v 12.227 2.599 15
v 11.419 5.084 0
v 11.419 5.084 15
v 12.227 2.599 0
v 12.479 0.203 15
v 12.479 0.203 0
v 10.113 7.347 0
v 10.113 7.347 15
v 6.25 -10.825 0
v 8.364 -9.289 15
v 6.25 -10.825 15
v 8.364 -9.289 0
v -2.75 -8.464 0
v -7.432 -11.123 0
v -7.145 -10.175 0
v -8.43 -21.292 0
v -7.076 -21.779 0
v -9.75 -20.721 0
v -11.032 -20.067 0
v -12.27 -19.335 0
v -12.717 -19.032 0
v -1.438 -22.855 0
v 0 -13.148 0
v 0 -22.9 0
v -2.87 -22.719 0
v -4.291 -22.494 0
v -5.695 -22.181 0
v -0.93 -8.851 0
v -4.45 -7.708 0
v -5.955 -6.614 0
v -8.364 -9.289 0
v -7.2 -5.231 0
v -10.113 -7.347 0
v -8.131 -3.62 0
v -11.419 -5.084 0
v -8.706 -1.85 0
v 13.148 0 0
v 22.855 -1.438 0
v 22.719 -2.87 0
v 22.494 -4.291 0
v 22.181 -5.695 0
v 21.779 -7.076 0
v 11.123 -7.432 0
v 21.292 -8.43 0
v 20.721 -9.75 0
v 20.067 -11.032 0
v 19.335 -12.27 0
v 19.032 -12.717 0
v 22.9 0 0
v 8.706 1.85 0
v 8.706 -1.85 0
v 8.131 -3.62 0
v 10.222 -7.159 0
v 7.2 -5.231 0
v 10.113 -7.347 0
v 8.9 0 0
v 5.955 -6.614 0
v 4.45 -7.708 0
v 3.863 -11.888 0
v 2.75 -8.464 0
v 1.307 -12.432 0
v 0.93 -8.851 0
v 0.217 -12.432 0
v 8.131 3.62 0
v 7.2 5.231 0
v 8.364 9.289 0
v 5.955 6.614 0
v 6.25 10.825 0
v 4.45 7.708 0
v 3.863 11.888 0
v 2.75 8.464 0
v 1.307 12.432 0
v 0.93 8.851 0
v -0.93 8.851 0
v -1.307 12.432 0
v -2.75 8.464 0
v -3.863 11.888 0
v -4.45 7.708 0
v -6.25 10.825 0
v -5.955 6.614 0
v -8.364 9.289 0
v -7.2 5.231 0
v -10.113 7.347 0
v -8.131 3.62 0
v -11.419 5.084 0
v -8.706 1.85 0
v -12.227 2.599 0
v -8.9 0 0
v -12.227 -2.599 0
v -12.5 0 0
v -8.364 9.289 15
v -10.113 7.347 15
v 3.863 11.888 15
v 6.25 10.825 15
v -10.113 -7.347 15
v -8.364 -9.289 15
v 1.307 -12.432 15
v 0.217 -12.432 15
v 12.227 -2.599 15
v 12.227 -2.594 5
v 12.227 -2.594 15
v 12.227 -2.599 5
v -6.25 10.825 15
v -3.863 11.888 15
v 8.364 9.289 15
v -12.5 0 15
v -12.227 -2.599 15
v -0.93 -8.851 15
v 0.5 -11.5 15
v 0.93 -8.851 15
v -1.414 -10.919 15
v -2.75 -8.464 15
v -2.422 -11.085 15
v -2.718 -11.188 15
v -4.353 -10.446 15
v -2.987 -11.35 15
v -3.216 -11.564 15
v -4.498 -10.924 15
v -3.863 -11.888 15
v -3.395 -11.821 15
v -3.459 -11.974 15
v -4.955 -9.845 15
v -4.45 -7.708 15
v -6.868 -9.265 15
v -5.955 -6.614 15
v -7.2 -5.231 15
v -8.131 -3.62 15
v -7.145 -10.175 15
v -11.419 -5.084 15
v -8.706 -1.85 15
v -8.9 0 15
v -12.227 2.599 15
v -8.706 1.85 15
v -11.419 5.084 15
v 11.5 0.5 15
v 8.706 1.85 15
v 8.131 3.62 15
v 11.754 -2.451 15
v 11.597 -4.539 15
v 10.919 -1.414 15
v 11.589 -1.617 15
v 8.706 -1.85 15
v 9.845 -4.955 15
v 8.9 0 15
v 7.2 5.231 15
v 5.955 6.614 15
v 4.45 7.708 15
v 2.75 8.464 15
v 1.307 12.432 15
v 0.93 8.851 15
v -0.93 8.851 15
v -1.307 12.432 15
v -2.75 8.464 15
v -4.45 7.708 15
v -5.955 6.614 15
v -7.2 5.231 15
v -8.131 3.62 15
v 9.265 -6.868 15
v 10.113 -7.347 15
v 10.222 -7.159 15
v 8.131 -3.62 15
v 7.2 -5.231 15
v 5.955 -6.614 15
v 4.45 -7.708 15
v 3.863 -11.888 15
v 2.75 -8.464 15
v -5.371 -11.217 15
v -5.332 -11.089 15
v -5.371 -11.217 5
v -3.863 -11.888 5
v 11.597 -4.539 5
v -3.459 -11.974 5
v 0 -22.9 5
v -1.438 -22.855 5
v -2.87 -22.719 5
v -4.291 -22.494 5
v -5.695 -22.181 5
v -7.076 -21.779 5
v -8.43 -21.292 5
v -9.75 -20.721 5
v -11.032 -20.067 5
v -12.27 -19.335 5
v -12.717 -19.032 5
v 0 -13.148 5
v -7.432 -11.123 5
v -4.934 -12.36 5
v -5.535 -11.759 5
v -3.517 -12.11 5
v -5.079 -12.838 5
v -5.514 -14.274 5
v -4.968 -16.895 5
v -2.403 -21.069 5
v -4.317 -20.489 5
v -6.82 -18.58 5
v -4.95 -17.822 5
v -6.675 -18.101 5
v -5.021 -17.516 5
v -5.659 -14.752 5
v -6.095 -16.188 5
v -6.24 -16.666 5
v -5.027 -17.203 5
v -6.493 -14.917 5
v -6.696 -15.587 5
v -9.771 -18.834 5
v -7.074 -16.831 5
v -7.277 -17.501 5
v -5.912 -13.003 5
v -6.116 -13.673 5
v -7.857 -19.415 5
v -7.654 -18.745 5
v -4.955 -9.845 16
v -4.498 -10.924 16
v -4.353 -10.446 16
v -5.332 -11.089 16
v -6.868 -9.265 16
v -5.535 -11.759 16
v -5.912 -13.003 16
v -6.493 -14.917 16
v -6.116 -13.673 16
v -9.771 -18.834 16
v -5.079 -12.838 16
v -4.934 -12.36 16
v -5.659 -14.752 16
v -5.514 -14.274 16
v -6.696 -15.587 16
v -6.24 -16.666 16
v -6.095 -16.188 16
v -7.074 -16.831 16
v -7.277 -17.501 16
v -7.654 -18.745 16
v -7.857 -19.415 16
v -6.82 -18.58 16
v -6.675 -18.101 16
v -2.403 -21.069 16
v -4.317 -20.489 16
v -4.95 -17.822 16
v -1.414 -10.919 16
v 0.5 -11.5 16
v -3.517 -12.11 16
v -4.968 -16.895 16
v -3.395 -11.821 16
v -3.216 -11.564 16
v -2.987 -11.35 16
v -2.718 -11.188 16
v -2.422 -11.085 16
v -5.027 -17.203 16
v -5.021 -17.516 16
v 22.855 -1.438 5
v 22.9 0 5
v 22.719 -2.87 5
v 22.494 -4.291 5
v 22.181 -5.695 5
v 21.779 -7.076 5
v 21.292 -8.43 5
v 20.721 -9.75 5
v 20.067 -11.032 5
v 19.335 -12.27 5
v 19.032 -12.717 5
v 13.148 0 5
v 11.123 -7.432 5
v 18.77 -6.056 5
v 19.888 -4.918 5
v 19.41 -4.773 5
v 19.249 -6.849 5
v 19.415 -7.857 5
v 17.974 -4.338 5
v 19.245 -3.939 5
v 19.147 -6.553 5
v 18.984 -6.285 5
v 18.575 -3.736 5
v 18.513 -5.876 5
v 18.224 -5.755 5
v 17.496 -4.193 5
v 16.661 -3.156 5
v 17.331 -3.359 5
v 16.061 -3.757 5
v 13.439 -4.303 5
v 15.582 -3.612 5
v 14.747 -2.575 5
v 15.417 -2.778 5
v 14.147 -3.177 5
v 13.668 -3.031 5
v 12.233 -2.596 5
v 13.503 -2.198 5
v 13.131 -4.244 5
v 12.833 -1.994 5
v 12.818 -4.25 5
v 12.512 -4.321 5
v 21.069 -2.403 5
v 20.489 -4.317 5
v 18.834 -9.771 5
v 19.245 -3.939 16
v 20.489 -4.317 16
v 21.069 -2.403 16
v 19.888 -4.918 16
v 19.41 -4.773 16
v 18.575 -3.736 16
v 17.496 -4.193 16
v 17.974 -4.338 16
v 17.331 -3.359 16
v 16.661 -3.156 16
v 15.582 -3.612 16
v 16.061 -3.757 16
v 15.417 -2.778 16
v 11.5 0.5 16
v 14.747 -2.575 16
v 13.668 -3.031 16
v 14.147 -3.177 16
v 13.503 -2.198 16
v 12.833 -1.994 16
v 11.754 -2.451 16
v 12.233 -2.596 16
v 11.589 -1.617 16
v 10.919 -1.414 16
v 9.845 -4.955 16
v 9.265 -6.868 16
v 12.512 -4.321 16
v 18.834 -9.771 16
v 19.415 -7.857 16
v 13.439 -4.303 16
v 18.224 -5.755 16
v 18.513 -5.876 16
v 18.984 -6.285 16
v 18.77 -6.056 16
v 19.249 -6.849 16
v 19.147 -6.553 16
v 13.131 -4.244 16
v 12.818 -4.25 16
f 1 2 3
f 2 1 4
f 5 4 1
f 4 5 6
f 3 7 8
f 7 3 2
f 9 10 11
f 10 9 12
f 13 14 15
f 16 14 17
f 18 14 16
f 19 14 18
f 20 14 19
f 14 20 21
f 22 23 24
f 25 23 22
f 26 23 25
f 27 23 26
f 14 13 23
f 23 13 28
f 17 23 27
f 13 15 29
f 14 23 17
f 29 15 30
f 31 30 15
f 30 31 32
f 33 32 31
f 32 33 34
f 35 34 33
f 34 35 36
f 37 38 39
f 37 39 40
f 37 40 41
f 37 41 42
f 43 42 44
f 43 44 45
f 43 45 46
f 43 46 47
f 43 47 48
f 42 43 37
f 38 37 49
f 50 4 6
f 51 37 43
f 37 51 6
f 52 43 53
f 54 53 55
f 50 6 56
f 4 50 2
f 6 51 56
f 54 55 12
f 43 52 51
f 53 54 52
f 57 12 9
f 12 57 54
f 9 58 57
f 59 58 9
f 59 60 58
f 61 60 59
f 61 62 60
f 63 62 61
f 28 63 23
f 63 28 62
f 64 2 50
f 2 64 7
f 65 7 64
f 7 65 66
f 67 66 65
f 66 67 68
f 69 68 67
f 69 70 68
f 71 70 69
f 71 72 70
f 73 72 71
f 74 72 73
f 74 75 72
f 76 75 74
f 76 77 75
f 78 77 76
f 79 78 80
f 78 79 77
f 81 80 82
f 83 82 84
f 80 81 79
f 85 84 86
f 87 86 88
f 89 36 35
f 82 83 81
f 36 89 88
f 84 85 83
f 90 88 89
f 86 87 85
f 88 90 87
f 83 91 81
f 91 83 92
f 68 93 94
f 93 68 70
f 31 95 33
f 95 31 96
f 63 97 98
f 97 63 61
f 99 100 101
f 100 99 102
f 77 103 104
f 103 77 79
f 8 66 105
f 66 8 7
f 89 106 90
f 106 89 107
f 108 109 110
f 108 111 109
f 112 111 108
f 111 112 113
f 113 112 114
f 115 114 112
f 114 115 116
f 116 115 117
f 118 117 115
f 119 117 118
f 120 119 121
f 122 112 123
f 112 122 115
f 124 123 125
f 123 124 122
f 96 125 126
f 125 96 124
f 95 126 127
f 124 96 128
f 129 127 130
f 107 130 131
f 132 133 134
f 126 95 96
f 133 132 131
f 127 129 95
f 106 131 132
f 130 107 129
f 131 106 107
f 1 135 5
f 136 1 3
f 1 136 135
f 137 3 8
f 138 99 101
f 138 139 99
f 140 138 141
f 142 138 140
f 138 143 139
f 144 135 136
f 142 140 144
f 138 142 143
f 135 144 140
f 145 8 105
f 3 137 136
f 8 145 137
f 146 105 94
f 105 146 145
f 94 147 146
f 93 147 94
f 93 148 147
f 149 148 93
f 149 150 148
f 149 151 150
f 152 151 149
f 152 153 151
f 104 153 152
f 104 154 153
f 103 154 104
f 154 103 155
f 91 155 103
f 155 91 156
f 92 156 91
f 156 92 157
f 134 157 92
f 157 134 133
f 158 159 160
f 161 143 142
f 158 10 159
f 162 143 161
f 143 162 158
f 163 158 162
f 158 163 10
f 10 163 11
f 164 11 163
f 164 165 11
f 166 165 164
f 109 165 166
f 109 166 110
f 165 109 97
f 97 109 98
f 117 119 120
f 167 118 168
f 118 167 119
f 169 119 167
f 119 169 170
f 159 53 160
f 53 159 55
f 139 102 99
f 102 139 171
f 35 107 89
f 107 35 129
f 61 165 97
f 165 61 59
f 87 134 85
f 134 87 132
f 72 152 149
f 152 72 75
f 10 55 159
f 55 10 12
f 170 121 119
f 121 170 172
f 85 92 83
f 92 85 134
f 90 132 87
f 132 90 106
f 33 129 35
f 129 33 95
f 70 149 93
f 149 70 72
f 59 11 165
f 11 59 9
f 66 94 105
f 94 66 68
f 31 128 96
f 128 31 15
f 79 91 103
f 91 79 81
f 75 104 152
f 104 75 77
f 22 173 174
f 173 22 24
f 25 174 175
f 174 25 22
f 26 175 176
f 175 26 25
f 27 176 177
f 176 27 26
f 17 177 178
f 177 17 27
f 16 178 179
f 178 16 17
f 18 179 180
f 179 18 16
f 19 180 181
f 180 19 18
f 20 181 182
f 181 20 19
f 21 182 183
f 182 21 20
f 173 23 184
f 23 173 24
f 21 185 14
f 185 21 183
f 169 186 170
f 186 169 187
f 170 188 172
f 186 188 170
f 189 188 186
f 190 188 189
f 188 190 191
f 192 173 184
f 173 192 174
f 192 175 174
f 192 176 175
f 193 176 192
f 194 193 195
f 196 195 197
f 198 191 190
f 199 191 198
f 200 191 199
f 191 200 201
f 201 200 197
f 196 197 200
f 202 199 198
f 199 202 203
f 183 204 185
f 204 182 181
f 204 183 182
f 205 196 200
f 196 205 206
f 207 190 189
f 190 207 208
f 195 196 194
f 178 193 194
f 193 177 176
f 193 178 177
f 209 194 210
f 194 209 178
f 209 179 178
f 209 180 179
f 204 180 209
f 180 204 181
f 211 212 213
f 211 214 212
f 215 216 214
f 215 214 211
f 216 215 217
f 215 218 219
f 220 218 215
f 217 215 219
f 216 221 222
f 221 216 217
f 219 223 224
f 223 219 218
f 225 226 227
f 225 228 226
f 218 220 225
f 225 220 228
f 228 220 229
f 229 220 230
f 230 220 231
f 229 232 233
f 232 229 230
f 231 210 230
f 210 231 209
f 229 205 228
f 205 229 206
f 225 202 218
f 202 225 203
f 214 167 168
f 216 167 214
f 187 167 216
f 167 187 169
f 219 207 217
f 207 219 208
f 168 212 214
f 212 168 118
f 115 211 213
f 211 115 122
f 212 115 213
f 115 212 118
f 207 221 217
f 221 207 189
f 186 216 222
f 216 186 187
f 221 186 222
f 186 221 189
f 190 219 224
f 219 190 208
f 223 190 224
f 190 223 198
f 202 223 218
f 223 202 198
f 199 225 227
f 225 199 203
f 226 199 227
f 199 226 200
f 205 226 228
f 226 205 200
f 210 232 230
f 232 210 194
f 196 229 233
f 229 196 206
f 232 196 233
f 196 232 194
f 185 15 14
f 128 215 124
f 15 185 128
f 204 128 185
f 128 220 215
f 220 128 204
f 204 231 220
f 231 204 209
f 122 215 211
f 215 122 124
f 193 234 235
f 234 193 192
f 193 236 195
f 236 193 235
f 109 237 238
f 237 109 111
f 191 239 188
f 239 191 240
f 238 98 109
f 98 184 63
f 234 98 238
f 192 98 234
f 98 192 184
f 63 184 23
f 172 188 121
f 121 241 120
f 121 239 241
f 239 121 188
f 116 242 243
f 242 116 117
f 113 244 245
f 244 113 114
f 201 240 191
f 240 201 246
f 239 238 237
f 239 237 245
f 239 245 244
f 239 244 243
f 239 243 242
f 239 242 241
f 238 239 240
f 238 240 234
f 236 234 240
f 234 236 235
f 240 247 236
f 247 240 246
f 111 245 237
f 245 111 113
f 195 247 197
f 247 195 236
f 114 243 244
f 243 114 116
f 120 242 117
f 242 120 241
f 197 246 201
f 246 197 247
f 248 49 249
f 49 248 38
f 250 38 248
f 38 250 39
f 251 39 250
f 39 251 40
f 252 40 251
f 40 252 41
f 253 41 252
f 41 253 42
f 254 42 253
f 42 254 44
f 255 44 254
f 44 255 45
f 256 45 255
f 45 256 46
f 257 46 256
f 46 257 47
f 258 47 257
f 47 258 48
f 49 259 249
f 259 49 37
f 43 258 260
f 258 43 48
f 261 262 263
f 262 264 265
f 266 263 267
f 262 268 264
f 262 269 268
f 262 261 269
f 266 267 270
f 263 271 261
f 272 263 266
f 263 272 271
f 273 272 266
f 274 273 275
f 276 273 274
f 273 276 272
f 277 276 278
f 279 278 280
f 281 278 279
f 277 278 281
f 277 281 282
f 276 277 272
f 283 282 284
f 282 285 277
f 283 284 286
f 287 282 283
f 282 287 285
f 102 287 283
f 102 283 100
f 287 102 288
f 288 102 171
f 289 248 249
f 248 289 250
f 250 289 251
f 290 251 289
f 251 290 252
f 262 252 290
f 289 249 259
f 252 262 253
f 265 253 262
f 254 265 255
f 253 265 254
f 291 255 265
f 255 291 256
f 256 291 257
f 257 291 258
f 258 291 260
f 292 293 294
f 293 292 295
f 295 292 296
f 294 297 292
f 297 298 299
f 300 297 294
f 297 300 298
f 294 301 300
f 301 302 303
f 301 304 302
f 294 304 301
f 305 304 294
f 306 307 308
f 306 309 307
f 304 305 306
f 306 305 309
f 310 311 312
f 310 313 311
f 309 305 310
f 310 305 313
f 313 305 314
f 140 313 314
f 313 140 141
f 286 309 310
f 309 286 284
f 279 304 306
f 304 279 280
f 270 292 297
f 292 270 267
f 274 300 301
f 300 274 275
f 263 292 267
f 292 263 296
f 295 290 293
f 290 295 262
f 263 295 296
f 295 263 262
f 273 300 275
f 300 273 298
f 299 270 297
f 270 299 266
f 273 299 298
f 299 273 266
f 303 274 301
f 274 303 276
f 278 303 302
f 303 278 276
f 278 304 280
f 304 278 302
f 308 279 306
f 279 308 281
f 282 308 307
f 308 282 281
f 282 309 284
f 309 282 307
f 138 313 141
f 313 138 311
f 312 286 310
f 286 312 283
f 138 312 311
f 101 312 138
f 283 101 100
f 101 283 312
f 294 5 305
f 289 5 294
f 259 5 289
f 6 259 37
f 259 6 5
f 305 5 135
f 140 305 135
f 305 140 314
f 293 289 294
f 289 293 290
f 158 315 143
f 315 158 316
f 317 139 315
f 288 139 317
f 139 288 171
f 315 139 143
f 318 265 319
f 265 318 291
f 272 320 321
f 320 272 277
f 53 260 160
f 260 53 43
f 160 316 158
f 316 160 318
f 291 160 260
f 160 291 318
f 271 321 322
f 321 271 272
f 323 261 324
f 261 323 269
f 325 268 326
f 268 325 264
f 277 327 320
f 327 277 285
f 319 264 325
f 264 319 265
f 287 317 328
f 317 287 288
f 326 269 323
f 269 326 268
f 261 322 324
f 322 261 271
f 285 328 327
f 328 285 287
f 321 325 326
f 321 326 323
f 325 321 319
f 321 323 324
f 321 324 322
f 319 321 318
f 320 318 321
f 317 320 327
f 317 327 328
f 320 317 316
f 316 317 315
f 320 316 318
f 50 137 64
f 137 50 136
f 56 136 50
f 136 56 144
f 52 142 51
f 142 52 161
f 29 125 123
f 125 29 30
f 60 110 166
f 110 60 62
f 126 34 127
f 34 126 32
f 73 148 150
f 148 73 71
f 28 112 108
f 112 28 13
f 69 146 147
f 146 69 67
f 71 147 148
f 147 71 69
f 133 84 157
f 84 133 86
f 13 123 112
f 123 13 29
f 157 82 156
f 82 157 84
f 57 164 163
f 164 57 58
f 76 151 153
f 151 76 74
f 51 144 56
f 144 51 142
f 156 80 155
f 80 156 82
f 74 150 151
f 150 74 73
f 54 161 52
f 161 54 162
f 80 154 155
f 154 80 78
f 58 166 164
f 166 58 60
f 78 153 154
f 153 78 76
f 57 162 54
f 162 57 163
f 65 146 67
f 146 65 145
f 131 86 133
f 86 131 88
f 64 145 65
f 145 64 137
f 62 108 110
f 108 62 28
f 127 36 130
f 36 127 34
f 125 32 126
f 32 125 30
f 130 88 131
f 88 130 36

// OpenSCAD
// file: gondola_base.scad
$fn = 40;
// ------------ Base
base_radio = 50/2;
base_height = 5;
base_wall = 3;
// ------------ Holder
holder_base_radio = 25/2;
holder_base_height = base_height + 10;
holder_radio = 17/2;
holder_wall = 2;
holder_height = 50;
// ------------ Screw
screw_diameter = 4;


module HolderBase(delta = 0){
	difference(){
	    cylinder(r = holder_base_radio , h = holder_base_height);
	    cylinder(r = holder_radio - holder_wall + delta, h = holder_base_height);
	}
}

module Base(){
	module BaseBase(){
		size = [5, base_radio*2, base_height];
		difference(){
		    union(){
		        translate([0, 0, base_height/2])
		            cube(size, true);
		        rotate(90)
		            translate([0, 0, base_height/2])
		                cube(size, true);
		        }
		    cylinder(r = holder_radio - holder_wall, h = base_height);
		}
	
		difference(){
			cylinder(r = base_radio, h = base_height);
			cylinder(r = base_radio - base_wall, h = base_height);
		}
	}
	
	
	module Holder(){
		difference(){
			cylinder(r = holder_radio, h = holder_height);
			cylinder(r = holder_radio - holder_wall, h = holder_height);

translate([0, holder_radio, 0.9*holder_height])
			rotate([90,0,0])
			cylinder(r = screw_diameter/2, h = holder_radio*2);
	}
		}

BaseBase();
HolderBase();
Holder();
}
//Base();
// main file
include <gondola_base.scad>

holder_radio_shrink = 2;
arm_height = 10;
arm_belt_radius = 10;
$fn = 30;
trap_distance = 1.2; 
belt_height = 6;
arm_delta = 0.4;

/* 
 * Excerpt from... 
 * Parametric Encoder Wheel 
 * by Alex Franke (codecreations), March 2012
 * http://www.theFrankes.com
 * Licenced under Creative Commons Attribution - Non-Commercial - Share Alike 3.0 
*/
 
module arc( height, depth, radius, degrees ) {
    // This dies a horible death if it's not rendered here 
    // -- sucks up all memory and spins out of control 
    render() {
        difference() {
            // Outer ring
            rotate_extrude($fn = 100)
                translate([radius - height, 0, 0])
                    square([height,depth]);
         
            // Cut half off
            translate([0,-(radius+1),-.5]) 
                cube ([radius+1,(radius+1)*2,depth+1]);
         
            // Cover the other half as necessary
            rotate([0,0,180-degrees])
            translate([0,-(radius+1),-.5]) 
                cube ([radius+1,(radius+1)*2,depth+1]);
         
        }
    }
}

// Nicked from https://cdn.thingiverse.com/zipfiles/da/60/31/e2/71/RepRap_Pro_Ormerod_iamburnys_Y-axis_Belt_Clamp_-_Parametric.zip
module teeth(){
	module tooth() {
		x = 1.3;
		y = arm_height + belt_height;
		z= 0.75;
		a = 0.4;
	
		polyhedron(
			points=[[0,0,0] , [a,0,z] , [x-a,0,z] , [x,0,0] ,[0,y,0] , [a,y,z] , [x-a,y,z] , [x,y,0]],
			triangles=[[3,4,0],[3,7,4],  [1,5,2],[2,5,6],  [0,1,2],[0,2,3], [0,4,5], [0,5,1],  [7,6,5], [7,5,4],  [3,2,6], [3,6,7]
			]);
	}

	translate ([0,-10,0])
	        cube([arm_height + belt_height,10,2]);
	
	for (i = [0:4]) {
		translate([arm_height + belt_height,-10+(i*2),2])
			rotate([0,0,90])
				tooth();
    
	}
}

module ArmBase(){
	difference(){
	    arc(20, arm_height, holder_base_radio + arm_belt_radius + arm_delta, 33.75);   
	    translate([0, 0, arm_height/2]) arc(20, arm_height/2, holder_base_radio + arm_belt_radius+ arm_delta, 33.75);   
	}
}


module Trap(){
		translate([-3.5 - 2 - trap_distance, -5, (arm_height + belt_height)/2])
			resize([0, 0, arm_height + belt_height])
				rotate([180,-90, 0])
					hull(){
						cube([7, 10, 2], true);
						translate([0, -3.5/2, 3.5/3])rotate([0,90,0]) cylinder(7, 1.5, 1.5, true);
						translate([0, 5 - 3.5/2, 3.5/3])rotate([0,90,0]) cylinder(7, 1.5, 1.5, true);
					}
}


module RightArmTrap(){
	translate([0.5, -holder_base_radio + arm_belt_radius - 4 - arm_height/2, 0])
		rotate([0,0,-33.75/2]){
			translate([-(trap_distance + 6.5), -10,0])	
				rotate([0,0,180])
			union(){
				rotate([0,-90,0])
					teeth();
		
				Trap();
			}
		}
}


module ArmTrap(){
	translate([0.5, -holder_base_radio + arm_belt_radius - 4 - arm_height/2, 0])
		rotate([0,0,-33.75/2]){
			rotate([0,-90,0])
				teeth();

			Trap();
		}
}


module Arm(){
	difference(){
	    union(){
	        HolderBase(delta=arm_delta);
	        ArmBase();
	        RightArmTrap();
	
	        rotate(90){
	            ArmBase();
	            ArmTrap();
	        }
	    }
	    cylinder(r = holder_radio + arm_delta, h = holder_base_height);
	}
}

/*HolderBase();
//Base();
//	translate([0,0,20])
		color([1,0,1])
		Arm();
*/

Arm();
